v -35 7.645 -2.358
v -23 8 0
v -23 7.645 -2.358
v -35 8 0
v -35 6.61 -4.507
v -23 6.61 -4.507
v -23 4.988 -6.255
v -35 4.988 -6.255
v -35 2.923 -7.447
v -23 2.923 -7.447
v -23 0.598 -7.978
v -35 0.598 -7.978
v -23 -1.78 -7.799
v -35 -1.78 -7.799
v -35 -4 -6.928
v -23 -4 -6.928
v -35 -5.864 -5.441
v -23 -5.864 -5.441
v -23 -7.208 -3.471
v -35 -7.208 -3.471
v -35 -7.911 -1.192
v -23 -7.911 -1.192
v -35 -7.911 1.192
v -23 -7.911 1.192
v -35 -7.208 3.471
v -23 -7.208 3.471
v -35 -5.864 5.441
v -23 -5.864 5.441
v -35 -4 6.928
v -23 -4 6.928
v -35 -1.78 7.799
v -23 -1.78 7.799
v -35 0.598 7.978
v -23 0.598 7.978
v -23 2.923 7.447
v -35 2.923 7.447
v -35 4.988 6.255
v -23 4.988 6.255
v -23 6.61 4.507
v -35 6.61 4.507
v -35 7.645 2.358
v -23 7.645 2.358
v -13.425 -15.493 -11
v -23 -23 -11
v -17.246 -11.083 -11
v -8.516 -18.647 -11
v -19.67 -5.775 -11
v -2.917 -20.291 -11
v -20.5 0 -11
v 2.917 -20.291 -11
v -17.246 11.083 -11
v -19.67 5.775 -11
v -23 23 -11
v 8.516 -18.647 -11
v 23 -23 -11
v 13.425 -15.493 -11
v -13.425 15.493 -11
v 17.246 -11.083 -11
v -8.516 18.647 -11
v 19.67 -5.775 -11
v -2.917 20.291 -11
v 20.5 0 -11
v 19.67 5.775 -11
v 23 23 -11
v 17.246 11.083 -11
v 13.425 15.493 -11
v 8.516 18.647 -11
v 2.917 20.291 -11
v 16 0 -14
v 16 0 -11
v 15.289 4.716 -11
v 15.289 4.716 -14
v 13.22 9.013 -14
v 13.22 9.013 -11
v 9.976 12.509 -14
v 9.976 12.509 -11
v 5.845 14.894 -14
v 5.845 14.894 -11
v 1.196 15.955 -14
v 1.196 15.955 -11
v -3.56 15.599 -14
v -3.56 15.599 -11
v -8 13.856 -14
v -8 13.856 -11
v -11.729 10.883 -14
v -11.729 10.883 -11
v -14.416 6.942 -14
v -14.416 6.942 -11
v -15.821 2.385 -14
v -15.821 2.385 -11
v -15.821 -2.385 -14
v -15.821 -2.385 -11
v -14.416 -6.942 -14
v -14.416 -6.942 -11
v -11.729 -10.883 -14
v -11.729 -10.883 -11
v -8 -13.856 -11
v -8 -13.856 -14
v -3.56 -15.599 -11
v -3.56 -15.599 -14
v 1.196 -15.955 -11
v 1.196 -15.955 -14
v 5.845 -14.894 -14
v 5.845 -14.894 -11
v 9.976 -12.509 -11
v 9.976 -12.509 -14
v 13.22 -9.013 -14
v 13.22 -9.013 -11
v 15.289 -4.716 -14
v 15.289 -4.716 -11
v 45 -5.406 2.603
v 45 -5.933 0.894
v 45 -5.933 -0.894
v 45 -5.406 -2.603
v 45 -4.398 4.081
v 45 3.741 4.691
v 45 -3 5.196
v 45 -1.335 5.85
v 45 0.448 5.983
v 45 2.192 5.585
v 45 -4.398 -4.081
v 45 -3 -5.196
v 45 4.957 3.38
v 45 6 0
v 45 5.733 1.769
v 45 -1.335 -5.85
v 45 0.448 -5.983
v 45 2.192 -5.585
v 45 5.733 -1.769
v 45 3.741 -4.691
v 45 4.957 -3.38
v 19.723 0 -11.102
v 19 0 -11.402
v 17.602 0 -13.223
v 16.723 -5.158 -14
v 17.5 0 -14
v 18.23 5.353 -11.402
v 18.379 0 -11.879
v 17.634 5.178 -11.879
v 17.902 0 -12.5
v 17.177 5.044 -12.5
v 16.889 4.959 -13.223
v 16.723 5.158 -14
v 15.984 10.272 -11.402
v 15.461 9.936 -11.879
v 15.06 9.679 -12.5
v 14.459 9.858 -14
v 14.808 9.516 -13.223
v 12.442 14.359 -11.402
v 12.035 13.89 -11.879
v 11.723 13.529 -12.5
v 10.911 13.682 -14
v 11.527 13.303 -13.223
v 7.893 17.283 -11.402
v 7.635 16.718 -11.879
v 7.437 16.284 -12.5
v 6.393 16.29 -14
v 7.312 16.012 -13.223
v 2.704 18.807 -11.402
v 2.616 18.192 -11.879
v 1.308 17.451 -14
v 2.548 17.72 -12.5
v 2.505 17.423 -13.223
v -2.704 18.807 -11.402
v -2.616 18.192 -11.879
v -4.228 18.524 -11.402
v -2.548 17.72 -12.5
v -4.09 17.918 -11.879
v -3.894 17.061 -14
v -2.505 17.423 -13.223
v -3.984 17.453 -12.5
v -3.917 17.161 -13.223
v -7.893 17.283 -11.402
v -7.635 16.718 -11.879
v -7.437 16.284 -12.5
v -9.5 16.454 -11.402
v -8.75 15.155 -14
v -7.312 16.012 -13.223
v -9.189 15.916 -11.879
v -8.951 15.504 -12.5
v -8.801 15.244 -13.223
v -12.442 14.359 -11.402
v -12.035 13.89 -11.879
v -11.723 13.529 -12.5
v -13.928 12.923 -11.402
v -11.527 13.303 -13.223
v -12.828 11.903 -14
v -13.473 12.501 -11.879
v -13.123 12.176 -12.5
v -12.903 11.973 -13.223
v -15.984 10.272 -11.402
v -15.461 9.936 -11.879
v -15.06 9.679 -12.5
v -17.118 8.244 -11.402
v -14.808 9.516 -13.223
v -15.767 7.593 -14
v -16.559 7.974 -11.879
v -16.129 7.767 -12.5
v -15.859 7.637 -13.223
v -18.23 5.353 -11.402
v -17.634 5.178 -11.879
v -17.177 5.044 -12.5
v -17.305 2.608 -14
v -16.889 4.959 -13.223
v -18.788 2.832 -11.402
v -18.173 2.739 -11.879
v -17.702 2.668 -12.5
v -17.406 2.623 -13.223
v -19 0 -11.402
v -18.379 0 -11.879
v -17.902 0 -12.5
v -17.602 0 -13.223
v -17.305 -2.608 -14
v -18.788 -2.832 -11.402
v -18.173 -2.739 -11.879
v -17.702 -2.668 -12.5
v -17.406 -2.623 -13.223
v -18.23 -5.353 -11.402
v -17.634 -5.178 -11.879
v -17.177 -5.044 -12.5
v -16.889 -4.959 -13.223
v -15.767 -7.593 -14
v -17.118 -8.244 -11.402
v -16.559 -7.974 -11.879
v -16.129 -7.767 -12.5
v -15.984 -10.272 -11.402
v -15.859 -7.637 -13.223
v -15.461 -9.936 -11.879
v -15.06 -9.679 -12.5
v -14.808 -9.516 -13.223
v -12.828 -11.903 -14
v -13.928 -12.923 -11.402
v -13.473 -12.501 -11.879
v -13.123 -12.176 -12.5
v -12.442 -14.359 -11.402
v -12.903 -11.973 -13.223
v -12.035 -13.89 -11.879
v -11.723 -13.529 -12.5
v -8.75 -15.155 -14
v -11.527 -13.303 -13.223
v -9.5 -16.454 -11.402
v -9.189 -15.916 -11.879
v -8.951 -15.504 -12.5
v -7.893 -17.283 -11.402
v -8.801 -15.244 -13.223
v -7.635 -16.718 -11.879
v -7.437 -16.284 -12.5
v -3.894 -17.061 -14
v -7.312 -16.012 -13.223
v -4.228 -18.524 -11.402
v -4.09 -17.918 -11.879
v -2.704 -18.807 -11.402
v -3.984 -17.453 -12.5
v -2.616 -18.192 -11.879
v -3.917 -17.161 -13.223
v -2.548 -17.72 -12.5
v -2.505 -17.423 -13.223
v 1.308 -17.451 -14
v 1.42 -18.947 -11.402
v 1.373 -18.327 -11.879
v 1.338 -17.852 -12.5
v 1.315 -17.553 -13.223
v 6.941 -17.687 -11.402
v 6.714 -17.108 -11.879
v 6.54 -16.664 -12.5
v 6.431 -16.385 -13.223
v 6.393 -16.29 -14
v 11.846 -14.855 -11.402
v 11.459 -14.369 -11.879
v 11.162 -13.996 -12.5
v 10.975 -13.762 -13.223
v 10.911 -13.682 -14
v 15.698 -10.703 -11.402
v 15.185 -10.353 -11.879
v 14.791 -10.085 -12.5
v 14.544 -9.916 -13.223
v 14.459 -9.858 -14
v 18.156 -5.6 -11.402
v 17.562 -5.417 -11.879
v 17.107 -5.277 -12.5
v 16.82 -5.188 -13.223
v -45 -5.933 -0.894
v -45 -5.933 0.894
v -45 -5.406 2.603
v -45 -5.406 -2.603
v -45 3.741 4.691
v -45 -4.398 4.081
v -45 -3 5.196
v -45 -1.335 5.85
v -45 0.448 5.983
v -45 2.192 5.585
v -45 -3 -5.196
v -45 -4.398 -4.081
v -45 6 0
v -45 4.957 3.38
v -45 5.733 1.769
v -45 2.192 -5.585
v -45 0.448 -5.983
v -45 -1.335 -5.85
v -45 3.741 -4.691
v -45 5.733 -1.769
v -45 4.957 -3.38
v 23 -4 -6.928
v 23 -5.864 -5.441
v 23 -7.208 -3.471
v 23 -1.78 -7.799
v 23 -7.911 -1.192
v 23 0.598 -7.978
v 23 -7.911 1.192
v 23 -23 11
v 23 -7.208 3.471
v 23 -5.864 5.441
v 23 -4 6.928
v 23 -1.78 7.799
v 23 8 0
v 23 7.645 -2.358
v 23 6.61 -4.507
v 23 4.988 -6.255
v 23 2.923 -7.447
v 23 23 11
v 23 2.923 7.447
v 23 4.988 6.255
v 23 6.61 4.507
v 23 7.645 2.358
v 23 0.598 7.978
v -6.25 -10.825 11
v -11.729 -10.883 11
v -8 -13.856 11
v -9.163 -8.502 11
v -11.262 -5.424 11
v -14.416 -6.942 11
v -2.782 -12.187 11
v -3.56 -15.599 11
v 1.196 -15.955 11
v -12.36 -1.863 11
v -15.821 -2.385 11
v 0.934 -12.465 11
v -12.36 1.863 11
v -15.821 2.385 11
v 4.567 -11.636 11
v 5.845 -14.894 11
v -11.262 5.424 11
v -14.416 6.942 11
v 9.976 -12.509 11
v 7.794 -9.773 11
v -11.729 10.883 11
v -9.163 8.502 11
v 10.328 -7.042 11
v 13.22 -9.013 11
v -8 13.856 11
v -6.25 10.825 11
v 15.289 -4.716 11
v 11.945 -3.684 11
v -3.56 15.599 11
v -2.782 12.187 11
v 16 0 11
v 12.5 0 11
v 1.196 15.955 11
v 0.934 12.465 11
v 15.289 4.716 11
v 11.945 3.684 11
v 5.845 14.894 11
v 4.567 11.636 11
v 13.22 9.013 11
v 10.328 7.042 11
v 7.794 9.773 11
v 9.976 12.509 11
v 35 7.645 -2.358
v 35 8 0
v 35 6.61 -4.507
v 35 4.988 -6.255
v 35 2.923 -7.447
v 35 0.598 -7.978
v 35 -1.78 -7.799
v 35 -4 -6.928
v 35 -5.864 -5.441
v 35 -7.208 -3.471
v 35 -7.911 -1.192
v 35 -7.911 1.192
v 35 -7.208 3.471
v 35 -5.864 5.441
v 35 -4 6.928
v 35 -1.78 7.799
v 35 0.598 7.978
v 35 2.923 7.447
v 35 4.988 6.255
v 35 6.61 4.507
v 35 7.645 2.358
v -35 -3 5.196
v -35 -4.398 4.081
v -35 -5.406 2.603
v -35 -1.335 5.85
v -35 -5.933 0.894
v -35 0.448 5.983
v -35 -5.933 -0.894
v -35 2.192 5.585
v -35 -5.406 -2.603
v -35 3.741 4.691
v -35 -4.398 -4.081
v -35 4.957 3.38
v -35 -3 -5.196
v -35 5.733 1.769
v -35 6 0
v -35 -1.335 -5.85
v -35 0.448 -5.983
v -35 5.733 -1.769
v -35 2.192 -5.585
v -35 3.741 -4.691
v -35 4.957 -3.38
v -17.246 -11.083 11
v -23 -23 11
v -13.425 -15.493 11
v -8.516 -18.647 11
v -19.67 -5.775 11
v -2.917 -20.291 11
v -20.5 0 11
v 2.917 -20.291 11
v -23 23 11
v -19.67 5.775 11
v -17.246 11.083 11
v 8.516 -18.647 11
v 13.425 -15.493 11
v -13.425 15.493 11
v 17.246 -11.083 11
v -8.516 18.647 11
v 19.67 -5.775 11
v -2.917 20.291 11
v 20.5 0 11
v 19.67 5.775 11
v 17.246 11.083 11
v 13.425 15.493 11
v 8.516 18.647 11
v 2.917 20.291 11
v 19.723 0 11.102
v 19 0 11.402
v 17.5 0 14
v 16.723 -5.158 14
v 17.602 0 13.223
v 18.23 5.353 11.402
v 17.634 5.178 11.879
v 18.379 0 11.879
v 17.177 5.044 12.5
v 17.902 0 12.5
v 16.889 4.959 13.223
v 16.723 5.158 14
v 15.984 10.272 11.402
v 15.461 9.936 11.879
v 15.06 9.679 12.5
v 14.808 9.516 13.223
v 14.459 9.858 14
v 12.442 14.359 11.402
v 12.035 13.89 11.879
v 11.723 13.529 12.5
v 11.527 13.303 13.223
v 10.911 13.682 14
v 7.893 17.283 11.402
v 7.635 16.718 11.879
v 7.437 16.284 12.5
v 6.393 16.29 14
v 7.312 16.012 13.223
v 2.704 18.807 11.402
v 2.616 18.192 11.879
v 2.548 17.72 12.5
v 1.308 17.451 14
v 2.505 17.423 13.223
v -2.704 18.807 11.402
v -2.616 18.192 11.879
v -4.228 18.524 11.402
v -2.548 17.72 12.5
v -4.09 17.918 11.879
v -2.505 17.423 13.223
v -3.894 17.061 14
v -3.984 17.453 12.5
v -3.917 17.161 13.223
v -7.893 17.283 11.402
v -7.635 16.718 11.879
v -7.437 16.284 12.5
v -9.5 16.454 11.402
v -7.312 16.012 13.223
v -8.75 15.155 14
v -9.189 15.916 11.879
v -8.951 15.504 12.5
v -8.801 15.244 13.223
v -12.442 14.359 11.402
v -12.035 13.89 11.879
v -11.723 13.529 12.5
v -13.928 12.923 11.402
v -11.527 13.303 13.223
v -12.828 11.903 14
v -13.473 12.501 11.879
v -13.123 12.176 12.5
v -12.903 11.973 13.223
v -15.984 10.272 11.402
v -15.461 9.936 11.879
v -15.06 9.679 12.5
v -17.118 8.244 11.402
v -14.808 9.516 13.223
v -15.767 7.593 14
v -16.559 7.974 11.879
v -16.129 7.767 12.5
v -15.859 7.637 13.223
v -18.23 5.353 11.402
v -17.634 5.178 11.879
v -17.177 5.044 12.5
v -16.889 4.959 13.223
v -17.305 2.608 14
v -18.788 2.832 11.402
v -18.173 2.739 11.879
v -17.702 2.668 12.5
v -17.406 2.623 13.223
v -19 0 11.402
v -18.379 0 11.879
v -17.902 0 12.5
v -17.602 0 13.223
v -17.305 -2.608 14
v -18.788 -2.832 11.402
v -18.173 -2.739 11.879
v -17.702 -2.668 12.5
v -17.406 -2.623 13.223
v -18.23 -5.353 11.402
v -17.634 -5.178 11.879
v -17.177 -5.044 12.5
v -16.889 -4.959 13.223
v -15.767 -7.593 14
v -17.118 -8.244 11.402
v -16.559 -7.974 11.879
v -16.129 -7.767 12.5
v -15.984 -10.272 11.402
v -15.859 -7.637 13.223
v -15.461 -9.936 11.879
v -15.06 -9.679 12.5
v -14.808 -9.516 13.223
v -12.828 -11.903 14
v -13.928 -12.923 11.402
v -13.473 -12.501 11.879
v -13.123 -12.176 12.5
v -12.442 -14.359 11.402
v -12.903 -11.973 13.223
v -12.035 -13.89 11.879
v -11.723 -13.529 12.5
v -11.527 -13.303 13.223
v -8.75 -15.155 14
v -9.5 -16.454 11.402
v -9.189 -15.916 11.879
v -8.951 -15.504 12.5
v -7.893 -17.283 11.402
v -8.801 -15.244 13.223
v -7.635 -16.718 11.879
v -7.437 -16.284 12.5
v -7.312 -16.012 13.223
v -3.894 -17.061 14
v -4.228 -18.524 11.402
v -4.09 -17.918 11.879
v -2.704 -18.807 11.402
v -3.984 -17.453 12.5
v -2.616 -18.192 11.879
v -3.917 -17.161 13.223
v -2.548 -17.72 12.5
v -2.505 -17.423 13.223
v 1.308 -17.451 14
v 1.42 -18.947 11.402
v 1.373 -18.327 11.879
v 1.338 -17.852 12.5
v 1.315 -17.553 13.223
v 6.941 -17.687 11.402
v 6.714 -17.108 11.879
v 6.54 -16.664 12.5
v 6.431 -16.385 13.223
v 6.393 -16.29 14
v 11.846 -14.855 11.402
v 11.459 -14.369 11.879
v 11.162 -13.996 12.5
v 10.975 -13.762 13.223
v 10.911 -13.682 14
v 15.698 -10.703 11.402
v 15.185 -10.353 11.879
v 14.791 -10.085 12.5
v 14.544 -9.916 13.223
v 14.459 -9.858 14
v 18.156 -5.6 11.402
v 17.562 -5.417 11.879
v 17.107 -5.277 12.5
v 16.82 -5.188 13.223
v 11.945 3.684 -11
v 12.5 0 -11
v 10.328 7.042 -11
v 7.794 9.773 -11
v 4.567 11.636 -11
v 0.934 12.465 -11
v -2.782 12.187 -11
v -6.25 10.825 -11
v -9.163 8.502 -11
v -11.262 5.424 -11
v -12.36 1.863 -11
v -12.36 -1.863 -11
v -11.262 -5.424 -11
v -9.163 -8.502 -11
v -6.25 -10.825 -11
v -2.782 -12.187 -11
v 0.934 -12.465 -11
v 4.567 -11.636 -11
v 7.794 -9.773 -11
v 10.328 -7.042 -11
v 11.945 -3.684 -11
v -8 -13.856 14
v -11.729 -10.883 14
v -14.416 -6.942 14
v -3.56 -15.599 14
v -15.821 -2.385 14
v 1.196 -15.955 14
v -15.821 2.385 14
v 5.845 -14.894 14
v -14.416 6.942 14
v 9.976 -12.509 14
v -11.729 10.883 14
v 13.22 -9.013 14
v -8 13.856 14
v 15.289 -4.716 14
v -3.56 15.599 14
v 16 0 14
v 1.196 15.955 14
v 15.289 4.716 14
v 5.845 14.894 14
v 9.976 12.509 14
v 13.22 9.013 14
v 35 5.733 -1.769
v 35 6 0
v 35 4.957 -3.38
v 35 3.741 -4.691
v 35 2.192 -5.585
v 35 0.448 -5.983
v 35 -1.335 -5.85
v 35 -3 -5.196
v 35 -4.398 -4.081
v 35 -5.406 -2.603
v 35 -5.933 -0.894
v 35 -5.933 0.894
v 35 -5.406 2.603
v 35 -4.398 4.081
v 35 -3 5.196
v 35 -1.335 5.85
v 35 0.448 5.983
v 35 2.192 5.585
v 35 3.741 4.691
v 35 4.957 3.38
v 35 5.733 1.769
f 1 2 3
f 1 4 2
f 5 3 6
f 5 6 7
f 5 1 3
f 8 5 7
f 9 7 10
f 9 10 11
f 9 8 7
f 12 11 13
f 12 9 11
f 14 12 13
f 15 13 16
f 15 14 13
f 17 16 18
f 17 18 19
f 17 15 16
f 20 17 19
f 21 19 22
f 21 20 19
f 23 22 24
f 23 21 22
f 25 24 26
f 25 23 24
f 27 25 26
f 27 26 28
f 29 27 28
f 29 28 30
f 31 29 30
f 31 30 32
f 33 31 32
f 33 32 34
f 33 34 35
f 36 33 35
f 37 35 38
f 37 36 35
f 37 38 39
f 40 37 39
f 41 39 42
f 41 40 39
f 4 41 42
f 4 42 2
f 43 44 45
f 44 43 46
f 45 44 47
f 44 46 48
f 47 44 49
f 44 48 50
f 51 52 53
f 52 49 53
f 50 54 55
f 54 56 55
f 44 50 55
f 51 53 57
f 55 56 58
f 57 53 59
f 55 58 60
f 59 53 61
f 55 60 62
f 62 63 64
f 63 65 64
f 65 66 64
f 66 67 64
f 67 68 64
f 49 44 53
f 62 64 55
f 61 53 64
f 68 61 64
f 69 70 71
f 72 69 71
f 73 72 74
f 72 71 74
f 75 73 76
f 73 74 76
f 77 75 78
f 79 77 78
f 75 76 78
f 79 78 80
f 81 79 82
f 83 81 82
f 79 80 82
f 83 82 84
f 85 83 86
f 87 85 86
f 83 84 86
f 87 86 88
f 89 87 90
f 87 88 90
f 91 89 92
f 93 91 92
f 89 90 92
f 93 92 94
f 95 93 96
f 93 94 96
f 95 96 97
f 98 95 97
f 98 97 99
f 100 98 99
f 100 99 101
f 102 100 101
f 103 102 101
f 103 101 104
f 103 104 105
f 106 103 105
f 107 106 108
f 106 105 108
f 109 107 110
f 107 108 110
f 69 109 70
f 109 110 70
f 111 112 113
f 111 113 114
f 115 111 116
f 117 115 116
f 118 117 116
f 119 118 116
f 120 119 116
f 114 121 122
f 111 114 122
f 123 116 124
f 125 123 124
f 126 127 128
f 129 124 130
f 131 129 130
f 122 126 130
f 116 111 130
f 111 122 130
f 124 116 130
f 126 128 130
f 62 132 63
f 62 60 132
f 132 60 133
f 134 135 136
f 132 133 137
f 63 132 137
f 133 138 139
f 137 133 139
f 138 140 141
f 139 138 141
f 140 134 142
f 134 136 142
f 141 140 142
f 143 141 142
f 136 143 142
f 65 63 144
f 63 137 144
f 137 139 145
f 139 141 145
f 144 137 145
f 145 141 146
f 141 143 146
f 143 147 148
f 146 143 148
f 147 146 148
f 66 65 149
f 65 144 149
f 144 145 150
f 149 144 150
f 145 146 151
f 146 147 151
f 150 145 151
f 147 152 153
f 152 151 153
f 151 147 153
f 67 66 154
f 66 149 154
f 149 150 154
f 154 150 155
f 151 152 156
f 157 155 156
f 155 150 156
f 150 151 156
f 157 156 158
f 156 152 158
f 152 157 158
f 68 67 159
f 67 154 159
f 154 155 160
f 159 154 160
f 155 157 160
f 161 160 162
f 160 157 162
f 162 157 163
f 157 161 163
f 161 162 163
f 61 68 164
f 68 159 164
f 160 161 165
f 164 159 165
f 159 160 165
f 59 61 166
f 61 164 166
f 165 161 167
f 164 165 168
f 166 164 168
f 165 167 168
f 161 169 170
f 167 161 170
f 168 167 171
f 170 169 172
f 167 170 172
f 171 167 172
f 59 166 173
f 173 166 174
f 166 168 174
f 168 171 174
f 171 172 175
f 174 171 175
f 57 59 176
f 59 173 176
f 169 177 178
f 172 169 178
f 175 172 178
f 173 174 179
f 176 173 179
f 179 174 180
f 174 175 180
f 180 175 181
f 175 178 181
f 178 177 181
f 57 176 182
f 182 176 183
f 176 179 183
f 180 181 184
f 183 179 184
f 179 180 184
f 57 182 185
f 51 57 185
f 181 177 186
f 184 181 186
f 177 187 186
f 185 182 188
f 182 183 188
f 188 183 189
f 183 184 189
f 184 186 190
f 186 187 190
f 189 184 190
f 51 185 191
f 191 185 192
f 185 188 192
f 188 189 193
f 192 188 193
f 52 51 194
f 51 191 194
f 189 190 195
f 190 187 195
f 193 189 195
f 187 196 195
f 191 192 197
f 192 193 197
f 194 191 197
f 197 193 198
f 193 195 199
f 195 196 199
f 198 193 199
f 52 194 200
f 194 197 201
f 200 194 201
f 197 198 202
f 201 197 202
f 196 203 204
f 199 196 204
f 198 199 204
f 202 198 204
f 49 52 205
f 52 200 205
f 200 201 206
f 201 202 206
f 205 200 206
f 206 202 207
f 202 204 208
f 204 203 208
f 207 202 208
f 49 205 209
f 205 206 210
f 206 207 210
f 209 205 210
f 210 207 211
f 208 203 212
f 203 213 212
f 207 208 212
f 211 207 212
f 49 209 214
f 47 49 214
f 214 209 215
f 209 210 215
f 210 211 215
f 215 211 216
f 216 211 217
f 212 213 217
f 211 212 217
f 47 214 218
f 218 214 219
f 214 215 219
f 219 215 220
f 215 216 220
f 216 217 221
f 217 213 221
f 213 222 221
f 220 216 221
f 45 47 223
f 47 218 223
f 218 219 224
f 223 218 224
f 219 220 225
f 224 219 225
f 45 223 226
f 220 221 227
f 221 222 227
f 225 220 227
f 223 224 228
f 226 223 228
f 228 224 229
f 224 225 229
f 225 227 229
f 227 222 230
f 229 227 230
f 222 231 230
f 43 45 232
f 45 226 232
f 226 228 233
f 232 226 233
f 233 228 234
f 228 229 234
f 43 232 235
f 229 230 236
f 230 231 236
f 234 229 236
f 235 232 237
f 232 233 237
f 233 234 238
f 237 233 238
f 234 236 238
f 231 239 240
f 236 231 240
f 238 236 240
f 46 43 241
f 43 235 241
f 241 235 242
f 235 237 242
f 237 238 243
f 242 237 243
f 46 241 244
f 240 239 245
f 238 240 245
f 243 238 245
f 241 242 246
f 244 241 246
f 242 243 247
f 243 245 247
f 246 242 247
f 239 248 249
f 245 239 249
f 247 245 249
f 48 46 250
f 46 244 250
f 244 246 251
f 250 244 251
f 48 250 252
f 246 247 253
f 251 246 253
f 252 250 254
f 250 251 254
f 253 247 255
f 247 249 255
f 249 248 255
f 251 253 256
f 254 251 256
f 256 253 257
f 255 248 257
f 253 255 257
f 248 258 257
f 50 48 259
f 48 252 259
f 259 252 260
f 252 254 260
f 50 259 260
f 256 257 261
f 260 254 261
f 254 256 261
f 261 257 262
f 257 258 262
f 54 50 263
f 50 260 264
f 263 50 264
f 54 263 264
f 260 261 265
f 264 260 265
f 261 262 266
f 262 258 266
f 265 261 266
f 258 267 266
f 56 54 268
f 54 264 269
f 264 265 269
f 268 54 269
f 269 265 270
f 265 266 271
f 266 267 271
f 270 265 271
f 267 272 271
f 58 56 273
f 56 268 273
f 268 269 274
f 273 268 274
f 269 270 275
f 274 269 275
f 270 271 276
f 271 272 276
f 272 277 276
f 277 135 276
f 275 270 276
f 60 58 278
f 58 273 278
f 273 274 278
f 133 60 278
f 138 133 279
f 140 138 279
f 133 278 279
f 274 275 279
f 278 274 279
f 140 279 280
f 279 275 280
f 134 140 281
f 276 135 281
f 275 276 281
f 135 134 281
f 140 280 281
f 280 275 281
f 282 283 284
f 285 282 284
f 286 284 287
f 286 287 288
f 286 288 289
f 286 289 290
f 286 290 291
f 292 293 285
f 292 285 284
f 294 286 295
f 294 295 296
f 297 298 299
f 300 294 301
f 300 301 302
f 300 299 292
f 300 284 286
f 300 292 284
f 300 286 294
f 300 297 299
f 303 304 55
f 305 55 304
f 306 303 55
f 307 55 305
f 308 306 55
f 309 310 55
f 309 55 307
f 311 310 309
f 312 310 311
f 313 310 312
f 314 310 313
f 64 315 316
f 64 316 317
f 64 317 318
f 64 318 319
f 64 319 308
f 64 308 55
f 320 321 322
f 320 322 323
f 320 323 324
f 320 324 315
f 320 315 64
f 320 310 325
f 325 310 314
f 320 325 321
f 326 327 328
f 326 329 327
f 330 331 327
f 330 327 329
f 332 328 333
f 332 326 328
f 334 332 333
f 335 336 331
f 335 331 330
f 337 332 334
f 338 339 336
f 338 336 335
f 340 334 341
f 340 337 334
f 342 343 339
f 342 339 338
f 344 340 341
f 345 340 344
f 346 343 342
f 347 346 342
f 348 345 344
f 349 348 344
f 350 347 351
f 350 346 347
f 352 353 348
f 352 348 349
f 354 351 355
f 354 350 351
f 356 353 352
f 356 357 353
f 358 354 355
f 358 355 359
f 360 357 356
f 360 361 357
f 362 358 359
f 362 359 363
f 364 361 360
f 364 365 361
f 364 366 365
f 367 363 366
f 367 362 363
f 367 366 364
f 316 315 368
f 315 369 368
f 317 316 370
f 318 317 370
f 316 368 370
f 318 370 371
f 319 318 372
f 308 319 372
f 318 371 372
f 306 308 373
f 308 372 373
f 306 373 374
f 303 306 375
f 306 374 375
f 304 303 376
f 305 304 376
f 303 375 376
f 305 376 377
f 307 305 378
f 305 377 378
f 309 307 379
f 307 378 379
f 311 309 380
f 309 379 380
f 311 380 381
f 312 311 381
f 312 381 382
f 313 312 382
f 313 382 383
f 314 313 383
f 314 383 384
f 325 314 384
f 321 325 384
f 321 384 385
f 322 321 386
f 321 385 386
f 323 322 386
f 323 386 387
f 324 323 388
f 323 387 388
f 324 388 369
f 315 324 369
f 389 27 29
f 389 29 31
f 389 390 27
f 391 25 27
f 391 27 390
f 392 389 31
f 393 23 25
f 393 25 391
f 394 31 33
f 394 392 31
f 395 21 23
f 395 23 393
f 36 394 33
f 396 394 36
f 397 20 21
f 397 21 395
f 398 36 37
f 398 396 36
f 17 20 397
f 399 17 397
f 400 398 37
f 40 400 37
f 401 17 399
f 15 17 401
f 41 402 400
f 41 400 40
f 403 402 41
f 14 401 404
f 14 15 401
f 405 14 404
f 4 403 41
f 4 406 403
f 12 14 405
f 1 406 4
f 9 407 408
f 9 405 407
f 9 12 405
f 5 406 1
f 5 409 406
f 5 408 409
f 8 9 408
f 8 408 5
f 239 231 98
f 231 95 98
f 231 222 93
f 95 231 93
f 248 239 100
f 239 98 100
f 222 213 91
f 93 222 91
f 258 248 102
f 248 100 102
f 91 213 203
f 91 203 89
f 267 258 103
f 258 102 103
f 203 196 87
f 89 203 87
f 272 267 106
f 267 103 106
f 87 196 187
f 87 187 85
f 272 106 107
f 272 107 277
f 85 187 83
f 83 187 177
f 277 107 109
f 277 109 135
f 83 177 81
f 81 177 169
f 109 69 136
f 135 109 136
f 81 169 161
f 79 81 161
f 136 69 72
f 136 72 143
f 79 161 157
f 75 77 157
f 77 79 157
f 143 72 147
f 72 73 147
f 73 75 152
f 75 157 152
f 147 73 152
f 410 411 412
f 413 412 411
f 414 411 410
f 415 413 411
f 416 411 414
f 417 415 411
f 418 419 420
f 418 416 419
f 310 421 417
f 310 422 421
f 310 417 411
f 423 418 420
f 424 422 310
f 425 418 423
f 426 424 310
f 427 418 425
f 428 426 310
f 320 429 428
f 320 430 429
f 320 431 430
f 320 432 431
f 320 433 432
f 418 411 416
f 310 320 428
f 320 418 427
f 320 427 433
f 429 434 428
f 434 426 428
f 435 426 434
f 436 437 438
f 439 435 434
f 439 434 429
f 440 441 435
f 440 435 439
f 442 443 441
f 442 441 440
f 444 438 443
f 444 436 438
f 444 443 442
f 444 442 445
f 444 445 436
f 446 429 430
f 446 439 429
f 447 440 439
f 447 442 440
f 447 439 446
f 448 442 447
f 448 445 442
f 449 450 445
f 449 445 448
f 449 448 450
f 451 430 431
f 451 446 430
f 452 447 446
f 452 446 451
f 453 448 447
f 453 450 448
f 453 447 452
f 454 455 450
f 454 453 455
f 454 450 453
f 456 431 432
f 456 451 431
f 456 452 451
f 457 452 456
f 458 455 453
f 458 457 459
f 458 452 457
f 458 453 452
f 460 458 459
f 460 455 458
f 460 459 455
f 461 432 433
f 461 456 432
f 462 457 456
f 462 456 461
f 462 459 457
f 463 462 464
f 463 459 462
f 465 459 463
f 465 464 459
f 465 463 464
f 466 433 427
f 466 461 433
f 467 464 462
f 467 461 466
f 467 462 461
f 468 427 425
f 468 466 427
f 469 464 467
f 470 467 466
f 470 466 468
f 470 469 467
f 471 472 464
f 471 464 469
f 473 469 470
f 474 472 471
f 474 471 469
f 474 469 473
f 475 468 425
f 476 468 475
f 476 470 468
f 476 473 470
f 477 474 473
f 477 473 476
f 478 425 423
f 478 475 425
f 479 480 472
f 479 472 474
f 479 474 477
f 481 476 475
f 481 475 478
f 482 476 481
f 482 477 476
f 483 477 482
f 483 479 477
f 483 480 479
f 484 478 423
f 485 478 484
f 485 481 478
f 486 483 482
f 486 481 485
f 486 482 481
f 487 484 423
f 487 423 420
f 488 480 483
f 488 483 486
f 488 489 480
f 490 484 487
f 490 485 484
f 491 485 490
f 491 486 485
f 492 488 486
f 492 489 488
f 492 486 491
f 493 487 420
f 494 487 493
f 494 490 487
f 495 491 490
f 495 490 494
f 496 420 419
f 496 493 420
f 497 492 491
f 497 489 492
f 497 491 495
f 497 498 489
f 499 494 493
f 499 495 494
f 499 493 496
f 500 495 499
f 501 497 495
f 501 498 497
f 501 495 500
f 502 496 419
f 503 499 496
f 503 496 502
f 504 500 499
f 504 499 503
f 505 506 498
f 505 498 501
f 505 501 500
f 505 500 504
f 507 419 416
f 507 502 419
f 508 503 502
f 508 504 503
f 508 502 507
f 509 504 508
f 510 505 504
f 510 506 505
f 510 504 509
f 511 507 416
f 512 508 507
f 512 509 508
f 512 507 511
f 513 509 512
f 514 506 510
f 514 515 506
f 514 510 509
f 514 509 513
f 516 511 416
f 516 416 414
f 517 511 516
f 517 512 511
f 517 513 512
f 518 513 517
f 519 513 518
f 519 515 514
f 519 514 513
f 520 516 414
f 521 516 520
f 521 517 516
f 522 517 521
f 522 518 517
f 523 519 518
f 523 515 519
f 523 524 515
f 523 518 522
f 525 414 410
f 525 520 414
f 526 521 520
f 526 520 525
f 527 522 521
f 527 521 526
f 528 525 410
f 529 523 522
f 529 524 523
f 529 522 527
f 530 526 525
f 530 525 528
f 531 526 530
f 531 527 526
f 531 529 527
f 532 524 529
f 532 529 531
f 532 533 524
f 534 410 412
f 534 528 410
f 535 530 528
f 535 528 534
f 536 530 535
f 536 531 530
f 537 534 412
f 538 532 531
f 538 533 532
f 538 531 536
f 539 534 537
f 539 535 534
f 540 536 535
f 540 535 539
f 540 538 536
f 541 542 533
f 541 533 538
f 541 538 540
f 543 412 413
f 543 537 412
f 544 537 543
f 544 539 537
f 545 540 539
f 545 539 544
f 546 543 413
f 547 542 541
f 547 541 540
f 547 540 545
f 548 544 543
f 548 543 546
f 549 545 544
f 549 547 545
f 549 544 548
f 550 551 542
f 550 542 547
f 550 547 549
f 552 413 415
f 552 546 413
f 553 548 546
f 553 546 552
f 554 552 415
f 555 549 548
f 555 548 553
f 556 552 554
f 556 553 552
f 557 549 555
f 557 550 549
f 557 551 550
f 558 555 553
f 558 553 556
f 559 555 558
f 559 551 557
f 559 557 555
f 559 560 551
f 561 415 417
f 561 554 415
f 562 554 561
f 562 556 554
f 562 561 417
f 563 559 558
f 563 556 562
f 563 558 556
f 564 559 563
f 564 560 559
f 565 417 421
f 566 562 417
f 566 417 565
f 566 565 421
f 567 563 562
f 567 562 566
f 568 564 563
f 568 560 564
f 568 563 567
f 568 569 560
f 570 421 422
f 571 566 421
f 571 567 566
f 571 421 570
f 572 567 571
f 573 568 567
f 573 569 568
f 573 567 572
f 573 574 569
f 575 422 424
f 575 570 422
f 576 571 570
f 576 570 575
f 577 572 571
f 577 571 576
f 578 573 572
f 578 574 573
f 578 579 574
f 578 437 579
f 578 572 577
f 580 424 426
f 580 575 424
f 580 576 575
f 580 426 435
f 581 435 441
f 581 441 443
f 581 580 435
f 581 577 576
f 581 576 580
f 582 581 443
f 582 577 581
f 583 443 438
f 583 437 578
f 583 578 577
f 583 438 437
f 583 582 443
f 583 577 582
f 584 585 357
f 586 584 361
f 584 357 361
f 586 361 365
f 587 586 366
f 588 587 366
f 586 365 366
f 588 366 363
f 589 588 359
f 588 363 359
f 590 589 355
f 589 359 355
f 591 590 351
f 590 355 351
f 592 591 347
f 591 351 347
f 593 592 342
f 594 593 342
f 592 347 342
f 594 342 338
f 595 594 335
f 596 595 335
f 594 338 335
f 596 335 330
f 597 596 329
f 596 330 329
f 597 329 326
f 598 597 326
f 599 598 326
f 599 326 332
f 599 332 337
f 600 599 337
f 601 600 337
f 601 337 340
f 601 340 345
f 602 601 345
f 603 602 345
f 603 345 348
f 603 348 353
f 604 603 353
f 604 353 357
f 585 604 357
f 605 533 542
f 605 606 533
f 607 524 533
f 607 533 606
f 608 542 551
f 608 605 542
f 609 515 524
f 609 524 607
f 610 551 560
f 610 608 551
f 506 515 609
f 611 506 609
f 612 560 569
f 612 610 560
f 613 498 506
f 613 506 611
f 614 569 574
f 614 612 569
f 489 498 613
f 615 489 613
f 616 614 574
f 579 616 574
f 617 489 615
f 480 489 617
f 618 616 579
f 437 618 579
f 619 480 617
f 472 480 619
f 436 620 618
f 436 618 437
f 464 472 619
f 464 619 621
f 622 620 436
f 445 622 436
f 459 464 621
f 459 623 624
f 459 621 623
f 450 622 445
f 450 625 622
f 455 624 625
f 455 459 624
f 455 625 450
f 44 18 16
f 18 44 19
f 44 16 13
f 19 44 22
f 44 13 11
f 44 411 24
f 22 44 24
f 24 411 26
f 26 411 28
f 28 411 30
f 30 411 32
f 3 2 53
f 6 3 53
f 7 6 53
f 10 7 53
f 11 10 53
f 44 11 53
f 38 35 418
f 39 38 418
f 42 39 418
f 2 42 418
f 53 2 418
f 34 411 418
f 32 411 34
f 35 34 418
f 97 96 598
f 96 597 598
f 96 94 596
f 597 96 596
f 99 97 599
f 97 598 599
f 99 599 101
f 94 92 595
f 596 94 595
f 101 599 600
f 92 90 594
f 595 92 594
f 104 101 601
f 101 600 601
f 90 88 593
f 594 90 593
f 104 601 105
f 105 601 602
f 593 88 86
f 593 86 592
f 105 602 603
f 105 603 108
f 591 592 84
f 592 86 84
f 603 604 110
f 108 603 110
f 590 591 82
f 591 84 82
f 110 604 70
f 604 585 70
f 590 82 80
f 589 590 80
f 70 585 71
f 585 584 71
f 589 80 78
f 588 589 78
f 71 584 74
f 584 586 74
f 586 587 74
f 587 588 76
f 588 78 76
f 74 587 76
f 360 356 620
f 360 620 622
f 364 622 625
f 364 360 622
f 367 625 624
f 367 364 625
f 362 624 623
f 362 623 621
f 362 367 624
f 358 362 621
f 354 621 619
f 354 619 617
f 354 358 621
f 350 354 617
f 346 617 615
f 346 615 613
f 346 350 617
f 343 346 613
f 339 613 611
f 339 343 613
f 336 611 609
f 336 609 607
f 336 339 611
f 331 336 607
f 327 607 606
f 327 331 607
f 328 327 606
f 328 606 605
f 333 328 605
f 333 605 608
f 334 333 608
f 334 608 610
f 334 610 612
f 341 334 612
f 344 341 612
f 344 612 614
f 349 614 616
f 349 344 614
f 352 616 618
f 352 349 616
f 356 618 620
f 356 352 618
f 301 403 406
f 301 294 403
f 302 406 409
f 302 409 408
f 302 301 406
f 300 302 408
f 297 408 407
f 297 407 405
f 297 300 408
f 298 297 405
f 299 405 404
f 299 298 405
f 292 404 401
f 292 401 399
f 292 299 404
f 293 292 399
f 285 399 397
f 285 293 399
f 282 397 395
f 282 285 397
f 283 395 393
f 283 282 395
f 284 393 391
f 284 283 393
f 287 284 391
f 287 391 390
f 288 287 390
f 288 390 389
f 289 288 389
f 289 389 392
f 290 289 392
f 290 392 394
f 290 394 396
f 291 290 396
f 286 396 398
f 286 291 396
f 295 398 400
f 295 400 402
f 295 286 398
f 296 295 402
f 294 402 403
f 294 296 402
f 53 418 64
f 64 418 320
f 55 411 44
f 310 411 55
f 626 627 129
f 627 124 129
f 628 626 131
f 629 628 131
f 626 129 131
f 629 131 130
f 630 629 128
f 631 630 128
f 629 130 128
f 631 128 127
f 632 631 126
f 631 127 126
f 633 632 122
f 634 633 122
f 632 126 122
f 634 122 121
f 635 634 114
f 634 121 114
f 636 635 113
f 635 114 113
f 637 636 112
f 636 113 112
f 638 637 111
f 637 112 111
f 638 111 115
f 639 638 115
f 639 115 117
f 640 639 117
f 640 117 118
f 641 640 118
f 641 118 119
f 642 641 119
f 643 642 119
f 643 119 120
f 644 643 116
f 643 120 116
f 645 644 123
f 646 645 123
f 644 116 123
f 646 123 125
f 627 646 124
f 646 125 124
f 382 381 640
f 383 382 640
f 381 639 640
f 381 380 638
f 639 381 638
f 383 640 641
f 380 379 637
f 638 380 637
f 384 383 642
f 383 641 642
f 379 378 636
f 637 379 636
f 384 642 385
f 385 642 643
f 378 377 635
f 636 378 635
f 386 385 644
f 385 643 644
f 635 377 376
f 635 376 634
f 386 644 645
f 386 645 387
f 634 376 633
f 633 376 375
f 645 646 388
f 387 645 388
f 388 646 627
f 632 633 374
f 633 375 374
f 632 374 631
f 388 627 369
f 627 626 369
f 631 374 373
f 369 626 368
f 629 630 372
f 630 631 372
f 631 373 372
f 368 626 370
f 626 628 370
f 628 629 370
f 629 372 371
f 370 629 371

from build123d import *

# Parameters (mm, degrees)
SKETCH1_W           = 46
SKETCH1_H           = 46
BOSS_EXTRUDE3_DEPTH = 11
SKETCH3_R           = 17.5
SKETCH3_R_2         = 16
BOSS_EXTRUDE5_DEPTH = 3
SKETCH6_R           = 12.5
CUT_EXTRUDE2_DEPTH  = 40.268307832
FILLET1_R           = 3


with BuildPart() as part:
    # Sketch1 → Boss-Extrude3 (new, symmetric)
    with BuildSketch(Plane.XY):
        Rectangle(SKETCH1_W, SKETCH1_H)
    extrude(amount=BOSS_EXTRUDE3_DEPTH, both=True)

    # Sketch3 → Boss-Extrude5 (add)
    with BuildSketch(Plane.XY.offset(11)):
        Circle(SKETCH3_R)
        Circle(SKETCH3_R_2, mode=Mode.SUBTRACT)
    boss_extrude5 = extrude(amount=BOSS_EXTRUDE5_DEPTH)

    # Sketch6 → Cut-Extrude2 (cut, through all)
    with BuildSketch(Plane.XY.offset(11)):
        Circle(SKETCH6_R)
    extrude(amount=-CUT_EXTRUDE2_DEPTH, mode=Mode.SUBTRACT)

    # Mirror1: Boss-Extrude5 across plane
    add(boss_extrude5.mirror(Plane.XY))

    # Fillet1
    fillet1_edges = [part.edges().sort_by_distance(p)[0] for p in [
        (-17.5, 0, 11),
        (-17.5, 0, -11),
    ]]
    fillet(fillet1_edges, radius=FILLET1_R - 0.0001)  # a hair under: the kernel refuses the full size

    # Sketch9 → Revolve1 (revolve)
    with BuildSketch(Plane.XY):
        Polygon((-23, 0), (-23, 8), (-35, 8), (-35, 6), (-45, 6), (-45, 0), align=None)
    revolve1 = revolve(axis=Axis((-23, 0, 0), (-1, 0, 0)))

    # Mirror2: Revolve1 across plane
    add(revolve1.mirror(Plane(origin=(0, 0, 0), x_dir=(0, 0, 1), z_dir=(1, 0, 0))))


solid = part.part
